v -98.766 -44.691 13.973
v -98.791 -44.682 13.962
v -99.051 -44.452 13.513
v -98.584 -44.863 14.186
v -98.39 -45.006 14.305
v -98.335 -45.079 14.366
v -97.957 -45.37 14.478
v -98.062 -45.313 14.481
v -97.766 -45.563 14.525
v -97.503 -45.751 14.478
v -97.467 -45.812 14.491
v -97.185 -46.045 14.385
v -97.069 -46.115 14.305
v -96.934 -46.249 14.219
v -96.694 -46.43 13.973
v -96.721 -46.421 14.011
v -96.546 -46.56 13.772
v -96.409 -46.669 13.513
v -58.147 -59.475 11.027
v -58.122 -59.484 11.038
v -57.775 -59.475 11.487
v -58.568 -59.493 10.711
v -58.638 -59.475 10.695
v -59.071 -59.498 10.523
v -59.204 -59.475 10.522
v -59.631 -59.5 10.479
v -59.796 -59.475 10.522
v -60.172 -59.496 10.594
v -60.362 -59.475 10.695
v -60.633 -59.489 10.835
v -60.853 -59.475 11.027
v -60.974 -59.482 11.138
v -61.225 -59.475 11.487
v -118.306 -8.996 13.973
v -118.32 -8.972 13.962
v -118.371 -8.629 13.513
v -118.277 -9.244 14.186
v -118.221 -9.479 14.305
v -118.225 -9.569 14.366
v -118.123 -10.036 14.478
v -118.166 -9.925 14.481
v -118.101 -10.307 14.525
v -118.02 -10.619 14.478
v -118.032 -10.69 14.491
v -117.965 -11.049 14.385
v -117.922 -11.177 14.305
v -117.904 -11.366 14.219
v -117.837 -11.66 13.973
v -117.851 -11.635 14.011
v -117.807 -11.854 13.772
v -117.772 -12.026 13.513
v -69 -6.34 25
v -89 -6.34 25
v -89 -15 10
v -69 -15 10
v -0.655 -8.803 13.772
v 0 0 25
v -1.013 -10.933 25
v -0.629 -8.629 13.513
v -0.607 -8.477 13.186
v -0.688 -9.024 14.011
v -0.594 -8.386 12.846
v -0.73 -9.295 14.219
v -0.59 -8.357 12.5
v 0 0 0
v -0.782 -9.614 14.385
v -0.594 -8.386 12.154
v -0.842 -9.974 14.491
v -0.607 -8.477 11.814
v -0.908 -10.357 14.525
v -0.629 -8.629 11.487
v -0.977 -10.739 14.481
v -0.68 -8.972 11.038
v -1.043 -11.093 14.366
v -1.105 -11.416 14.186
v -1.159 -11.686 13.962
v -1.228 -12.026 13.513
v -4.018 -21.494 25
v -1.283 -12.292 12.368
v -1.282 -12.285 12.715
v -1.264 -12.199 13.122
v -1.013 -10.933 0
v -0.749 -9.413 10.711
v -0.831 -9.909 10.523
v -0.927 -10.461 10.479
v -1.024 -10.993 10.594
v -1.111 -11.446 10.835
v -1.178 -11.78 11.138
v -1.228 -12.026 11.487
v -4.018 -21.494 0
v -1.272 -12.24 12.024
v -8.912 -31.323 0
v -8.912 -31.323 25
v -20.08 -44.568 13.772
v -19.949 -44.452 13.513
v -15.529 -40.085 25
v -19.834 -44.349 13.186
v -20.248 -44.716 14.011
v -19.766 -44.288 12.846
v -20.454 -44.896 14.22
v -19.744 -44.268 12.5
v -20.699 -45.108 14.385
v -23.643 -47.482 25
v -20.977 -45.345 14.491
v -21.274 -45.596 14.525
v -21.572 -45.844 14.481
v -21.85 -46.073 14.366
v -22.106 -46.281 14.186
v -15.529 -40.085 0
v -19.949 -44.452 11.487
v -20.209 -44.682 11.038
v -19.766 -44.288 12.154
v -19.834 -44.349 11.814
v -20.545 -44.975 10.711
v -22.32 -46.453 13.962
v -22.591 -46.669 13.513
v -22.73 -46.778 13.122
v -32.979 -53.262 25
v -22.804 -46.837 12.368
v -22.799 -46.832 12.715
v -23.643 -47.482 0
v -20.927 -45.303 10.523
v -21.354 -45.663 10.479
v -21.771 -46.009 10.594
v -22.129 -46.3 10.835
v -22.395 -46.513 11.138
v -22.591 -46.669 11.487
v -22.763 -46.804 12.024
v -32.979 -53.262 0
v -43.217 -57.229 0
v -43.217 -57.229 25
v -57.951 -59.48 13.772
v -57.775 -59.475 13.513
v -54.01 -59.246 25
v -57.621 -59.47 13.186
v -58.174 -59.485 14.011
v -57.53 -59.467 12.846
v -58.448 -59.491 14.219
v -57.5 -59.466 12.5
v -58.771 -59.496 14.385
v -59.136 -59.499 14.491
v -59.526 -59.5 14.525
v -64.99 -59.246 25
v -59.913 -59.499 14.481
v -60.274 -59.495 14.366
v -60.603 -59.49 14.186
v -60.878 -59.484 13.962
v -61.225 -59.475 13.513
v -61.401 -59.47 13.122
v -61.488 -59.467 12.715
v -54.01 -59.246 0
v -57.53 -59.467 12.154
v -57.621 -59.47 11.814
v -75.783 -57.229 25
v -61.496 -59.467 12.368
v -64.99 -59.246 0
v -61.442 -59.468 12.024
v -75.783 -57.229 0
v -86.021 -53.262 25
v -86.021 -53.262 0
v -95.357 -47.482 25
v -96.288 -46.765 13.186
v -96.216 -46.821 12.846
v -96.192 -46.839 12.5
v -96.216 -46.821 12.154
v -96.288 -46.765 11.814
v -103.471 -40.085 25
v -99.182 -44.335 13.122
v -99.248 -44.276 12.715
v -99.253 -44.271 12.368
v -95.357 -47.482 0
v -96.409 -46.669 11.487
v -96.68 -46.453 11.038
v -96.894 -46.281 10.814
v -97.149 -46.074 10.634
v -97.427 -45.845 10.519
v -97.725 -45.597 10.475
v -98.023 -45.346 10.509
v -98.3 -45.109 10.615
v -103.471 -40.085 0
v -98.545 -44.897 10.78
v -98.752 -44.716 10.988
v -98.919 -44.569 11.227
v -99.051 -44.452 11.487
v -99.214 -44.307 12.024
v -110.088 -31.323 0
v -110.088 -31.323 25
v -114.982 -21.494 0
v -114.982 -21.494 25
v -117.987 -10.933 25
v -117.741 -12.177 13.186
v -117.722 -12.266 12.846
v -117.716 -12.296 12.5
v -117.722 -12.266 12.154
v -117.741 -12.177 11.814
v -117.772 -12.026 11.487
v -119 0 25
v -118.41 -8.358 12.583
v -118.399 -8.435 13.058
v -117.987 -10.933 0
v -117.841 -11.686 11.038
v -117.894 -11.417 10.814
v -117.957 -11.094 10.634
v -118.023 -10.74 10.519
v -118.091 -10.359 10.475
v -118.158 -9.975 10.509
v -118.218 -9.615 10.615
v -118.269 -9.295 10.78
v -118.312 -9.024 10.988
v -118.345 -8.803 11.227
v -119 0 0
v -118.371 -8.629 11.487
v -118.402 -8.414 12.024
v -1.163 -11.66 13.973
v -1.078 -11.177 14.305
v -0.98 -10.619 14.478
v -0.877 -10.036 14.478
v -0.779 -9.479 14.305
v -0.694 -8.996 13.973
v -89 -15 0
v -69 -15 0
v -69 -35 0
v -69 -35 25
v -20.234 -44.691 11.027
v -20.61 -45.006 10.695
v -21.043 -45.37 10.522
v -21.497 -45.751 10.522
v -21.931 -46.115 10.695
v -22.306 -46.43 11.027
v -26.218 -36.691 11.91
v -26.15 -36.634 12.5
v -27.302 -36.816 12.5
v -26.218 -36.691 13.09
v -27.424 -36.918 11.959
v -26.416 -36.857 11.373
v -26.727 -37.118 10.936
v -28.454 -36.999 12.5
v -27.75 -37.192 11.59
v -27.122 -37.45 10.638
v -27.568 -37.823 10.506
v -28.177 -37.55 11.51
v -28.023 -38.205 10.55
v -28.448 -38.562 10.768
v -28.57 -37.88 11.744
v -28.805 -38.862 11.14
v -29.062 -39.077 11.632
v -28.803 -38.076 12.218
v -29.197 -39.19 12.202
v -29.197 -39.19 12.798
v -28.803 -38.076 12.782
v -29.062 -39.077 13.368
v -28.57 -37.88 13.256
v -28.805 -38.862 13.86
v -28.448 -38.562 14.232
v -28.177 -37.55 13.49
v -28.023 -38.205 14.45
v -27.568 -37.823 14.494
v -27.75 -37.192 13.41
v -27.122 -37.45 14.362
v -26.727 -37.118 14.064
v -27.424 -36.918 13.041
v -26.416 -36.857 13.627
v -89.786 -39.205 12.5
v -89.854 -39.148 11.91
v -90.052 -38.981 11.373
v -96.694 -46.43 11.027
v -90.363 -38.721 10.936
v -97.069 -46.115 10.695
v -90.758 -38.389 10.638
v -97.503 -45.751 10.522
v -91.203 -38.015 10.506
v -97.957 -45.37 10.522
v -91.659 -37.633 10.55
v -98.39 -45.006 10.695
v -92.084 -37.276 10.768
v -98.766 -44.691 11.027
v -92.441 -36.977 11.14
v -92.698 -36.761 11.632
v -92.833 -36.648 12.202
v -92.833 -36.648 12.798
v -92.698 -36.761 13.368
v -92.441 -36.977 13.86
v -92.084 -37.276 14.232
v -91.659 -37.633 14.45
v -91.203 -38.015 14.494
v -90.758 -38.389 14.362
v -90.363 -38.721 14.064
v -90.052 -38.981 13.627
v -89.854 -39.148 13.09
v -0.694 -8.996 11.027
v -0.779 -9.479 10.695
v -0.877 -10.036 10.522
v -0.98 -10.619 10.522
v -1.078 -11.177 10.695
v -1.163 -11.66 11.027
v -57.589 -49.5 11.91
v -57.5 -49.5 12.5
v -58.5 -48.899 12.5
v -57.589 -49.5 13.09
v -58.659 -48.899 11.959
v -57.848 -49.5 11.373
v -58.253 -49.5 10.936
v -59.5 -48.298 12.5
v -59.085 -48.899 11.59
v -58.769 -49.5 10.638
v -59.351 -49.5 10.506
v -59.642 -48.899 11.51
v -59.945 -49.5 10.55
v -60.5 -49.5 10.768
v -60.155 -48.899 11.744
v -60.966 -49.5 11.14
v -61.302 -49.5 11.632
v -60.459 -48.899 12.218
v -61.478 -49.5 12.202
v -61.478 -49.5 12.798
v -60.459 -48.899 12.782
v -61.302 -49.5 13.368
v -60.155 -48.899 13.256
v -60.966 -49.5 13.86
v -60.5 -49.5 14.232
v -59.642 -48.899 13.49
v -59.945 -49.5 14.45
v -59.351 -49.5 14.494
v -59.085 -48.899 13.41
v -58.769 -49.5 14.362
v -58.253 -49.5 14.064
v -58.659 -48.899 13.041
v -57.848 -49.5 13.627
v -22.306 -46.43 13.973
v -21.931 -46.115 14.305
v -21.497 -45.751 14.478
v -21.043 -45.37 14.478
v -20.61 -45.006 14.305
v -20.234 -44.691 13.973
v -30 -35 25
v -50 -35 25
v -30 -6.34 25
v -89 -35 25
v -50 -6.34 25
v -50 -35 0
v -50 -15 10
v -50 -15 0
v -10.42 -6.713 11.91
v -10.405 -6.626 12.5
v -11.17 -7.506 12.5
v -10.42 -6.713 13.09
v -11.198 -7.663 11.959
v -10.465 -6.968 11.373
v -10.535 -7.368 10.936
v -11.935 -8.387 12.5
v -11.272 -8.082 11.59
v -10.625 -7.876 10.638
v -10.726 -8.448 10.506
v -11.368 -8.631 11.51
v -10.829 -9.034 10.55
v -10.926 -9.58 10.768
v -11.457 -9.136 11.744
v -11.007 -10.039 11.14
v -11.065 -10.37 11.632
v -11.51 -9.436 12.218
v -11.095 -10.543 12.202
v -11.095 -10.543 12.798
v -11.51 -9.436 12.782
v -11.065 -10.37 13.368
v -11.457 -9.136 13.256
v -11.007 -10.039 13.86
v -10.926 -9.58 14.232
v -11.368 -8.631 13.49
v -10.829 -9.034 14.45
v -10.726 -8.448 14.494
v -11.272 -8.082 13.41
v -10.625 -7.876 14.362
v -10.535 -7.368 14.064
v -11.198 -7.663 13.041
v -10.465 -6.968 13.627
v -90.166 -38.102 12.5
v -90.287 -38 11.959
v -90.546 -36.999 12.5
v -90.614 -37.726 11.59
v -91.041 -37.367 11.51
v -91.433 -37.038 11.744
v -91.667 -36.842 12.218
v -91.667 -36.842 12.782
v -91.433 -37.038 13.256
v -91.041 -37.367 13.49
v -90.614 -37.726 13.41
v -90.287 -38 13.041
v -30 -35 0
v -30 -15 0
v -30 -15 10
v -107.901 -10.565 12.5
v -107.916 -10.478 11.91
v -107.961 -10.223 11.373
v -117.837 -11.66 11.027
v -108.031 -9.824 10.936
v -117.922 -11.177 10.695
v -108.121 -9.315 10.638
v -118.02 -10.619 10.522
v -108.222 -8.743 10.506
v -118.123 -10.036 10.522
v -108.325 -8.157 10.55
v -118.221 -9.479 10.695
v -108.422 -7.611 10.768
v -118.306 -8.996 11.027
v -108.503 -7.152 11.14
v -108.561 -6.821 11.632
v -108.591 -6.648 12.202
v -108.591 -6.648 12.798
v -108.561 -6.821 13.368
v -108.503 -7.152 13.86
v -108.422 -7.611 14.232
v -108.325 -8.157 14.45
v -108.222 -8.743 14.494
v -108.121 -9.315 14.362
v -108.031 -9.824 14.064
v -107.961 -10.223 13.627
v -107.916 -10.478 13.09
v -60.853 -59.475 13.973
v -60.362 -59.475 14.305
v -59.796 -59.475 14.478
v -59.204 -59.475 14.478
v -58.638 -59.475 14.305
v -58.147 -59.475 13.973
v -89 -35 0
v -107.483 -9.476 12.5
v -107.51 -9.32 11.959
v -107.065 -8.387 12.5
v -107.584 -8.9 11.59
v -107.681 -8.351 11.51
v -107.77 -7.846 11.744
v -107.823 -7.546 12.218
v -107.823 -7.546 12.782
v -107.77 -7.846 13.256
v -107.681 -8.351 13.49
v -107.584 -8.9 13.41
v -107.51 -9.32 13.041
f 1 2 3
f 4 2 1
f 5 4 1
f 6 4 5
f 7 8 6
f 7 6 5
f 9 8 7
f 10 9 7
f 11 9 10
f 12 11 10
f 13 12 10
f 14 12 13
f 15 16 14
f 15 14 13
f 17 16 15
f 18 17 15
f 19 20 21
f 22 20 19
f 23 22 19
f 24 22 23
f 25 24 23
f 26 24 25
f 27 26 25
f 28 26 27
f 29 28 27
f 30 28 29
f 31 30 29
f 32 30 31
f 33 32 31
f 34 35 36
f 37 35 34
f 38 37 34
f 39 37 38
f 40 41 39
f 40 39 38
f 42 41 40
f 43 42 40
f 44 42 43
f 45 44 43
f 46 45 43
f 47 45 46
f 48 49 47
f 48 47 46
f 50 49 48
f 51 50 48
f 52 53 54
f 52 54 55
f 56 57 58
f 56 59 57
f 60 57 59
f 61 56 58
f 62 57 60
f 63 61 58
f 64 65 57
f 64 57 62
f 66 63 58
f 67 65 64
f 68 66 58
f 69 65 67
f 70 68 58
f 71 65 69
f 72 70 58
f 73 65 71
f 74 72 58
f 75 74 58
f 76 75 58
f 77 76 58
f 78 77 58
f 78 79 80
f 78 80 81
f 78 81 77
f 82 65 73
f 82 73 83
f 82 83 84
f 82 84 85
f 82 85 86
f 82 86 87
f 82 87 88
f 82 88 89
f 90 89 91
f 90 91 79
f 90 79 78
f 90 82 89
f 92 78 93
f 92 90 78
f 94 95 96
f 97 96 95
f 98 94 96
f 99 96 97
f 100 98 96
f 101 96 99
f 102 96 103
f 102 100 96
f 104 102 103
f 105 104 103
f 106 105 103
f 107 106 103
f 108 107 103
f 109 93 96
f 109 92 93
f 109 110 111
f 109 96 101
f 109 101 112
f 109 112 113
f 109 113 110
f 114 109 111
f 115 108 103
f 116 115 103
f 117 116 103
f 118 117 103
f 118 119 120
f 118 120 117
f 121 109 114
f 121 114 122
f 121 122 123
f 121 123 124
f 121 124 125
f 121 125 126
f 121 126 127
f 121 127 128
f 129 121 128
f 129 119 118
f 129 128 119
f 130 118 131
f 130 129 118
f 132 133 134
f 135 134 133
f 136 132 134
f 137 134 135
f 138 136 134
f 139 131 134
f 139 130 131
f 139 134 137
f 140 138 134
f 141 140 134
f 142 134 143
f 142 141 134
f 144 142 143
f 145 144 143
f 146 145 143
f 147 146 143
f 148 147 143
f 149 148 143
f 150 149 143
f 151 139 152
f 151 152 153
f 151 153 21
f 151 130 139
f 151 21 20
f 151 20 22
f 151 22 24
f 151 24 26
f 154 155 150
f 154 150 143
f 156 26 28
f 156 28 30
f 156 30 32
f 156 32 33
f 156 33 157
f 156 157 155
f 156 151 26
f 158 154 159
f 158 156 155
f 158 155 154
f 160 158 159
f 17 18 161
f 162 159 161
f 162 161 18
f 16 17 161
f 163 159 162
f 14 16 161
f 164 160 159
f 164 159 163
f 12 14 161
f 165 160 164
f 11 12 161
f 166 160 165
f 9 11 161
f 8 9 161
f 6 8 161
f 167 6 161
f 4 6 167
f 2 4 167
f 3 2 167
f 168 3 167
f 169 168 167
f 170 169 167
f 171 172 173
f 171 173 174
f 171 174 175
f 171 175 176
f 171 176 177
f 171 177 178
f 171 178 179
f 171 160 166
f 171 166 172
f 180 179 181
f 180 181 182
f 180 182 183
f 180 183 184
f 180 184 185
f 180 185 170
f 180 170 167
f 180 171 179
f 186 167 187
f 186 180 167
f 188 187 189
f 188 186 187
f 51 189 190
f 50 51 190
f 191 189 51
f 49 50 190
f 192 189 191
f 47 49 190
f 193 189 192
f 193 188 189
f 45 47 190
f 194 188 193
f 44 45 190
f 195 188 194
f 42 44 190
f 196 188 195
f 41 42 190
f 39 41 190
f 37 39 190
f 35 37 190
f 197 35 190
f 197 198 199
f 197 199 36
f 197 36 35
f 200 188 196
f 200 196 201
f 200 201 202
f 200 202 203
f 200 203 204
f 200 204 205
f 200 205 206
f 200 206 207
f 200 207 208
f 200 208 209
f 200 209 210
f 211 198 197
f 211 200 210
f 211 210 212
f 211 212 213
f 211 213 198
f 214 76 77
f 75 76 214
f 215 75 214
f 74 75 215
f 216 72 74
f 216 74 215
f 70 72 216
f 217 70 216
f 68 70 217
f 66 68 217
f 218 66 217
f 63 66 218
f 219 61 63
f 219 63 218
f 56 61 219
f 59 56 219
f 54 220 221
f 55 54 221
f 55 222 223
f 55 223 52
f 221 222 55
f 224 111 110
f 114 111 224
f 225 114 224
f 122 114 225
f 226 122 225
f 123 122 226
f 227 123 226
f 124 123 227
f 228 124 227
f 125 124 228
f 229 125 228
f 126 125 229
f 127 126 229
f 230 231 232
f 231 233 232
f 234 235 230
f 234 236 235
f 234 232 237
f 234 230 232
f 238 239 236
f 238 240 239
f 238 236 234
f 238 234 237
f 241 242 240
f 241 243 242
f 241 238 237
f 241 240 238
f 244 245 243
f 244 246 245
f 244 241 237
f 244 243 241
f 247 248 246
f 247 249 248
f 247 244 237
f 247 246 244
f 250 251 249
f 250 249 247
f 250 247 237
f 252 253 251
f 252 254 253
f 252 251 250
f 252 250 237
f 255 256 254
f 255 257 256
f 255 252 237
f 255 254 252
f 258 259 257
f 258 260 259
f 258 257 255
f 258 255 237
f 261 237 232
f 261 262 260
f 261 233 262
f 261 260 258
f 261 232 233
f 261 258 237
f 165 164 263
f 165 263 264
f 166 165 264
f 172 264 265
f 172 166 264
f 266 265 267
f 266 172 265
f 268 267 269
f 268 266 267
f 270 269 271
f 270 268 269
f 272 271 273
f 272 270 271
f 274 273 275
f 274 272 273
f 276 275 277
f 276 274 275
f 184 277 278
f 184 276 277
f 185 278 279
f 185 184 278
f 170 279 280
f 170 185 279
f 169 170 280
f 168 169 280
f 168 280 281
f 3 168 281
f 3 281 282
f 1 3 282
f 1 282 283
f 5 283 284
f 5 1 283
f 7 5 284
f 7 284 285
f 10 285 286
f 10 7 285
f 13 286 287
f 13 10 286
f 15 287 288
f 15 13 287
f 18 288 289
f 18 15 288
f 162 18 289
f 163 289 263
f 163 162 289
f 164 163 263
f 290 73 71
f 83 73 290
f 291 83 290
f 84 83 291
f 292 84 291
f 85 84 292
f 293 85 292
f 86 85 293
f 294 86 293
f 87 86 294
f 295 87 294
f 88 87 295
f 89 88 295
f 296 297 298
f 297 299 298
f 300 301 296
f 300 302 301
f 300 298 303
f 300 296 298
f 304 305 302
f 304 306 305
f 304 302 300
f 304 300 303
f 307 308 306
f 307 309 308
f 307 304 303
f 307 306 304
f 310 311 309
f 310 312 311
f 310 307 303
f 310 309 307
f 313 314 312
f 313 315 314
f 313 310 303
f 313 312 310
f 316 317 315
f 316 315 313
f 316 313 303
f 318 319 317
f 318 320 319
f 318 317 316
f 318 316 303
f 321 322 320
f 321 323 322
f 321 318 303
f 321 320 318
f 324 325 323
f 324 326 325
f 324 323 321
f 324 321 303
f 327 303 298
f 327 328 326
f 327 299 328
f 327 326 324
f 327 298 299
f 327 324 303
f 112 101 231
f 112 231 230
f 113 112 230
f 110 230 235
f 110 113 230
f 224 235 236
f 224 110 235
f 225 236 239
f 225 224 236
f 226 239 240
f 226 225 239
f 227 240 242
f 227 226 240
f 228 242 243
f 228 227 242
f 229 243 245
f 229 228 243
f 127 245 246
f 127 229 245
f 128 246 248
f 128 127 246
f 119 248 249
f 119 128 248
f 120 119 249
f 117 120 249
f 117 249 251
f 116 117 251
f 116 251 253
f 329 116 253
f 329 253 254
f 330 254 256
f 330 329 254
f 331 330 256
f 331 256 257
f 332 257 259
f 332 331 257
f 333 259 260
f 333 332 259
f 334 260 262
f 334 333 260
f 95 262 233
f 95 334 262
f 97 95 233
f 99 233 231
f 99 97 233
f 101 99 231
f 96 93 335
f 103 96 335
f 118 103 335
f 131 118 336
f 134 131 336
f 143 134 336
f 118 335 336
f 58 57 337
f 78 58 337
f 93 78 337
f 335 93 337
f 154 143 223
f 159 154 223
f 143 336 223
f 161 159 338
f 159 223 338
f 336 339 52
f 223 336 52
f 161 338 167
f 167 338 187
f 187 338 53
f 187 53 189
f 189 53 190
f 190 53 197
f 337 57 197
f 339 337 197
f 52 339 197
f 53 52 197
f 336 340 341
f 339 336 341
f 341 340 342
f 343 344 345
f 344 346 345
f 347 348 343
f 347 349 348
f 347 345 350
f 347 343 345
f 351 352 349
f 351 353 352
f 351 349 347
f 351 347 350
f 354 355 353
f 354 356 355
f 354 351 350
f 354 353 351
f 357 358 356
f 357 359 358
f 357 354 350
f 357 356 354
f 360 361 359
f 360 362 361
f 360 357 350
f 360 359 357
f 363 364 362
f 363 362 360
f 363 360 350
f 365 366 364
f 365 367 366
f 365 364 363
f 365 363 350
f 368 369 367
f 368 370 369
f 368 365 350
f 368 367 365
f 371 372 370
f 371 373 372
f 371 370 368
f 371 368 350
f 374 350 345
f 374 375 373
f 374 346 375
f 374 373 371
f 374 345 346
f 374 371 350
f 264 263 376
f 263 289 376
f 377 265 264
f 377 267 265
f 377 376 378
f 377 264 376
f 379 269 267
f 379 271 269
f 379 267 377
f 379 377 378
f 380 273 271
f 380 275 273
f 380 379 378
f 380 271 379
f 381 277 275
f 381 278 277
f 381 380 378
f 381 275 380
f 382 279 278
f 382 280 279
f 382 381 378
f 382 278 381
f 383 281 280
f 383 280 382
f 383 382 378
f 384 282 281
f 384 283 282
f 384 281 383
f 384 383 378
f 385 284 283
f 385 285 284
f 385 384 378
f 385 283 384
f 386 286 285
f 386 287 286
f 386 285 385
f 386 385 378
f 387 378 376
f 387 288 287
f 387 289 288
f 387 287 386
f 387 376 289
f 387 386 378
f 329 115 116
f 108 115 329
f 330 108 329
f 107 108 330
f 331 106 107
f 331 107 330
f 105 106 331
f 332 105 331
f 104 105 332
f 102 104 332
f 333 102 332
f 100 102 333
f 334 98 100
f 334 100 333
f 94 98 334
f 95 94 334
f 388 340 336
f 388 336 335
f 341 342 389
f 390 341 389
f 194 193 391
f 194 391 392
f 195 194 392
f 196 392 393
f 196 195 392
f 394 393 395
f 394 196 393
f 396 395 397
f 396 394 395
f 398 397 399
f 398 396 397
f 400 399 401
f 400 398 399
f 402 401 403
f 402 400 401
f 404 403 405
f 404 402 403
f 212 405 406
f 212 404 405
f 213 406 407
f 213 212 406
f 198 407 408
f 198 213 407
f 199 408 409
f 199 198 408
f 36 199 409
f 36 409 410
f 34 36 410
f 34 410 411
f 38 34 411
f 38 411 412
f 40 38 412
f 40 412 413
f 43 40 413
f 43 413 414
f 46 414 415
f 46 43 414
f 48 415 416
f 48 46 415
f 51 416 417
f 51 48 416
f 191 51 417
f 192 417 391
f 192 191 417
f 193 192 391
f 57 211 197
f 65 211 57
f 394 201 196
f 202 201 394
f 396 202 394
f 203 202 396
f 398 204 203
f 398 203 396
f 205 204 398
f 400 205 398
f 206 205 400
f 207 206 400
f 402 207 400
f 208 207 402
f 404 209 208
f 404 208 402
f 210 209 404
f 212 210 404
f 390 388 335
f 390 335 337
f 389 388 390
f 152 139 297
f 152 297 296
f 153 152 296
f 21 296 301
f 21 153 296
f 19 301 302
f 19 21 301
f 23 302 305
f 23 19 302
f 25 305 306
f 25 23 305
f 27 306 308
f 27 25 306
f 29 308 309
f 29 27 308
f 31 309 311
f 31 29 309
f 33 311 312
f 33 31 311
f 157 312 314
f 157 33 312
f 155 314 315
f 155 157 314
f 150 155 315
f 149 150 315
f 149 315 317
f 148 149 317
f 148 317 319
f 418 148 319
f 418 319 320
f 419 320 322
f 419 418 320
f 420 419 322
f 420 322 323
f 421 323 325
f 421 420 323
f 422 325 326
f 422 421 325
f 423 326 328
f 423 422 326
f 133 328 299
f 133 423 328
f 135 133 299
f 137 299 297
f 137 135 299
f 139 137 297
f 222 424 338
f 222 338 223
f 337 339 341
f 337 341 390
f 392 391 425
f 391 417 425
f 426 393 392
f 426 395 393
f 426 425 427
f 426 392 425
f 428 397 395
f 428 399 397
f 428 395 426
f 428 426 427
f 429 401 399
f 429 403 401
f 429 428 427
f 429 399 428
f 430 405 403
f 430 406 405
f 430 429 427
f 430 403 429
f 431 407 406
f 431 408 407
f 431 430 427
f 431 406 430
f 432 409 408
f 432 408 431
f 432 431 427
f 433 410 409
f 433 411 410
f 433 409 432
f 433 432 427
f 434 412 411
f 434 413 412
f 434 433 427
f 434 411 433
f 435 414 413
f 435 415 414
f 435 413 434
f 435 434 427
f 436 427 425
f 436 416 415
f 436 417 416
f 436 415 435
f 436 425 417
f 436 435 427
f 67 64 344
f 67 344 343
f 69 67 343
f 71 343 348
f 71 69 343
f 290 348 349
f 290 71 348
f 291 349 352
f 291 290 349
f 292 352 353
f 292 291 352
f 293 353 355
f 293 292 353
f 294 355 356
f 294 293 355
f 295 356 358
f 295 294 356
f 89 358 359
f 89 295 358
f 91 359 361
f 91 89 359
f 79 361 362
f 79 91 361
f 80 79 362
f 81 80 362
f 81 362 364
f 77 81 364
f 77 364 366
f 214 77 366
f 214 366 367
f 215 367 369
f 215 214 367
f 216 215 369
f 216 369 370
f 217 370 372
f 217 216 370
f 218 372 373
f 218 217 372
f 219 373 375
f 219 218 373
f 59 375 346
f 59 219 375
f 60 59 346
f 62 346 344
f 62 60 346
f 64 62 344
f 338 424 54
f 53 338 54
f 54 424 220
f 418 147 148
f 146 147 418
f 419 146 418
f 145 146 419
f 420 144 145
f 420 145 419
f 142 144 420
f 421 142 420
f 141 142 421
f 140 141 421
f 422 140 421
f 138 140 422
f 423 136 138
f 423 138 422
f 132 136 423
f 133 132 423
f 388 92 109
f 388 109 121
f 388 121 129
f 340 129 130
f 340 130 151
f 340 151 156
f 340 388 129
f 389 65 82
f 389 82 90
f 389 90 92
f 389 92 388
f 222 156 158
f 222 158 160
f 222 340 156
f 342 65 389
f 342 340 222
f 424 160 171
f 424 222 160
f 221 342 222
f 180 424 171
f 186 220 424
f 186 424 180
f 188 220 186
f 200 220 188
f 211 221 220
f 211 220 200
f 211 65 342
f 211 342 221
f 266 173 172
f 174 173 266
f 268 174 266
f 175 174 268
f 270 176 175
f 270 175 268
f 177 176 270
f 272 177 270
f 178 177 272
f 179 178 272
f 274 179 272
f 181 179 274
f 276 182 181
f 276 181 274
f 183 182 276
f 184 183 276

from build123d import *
from OCP.BRepFilletAPI import BRepFilletAPI_MakeChamfer

# Parameters (mm, degrees)
SKETCH1_W           = 20
SKETCH1_H           = 20
BOSS_EXTRUDE1_DEPTH = 25
CIRPATTERN1_COUNT   = 5
CIRPATTERN1_ANGLE   = 160
CHAMFER1_SIZE       = 15
CHAMFER1_SIZE2      = 8.660254038


with BuildPart() as part:
    # Sketch1 → Boss-Extrude1 (new body)
    with BuildSketch(Plane.XY):
        with BuildLine():
            Line((-119, 0), (0, 0))
            ThreePointArc((0, 0), (-59.5, -59.5), (-119, 0))
        make_face()
        with Locations((-40, -25)):
            Rectangle(SKETCH1_W, SKETCH1_H, mode=Mode.SUBTRACT)
        with Locations((-79, -25)):
            Rectangle(SKETCH1_W, SKETCH1_H, mode=Mode.SUBTRACT)
    extrude(amount=BOSS_EXTRUDE1_DEPTH)

    # Sketch4 → Ø4.0mm Dowel Hole2 (revolve, cut)
    with BuildSketch(Plane(origin=(-0.903938696, -10.332066571, 12.5), x_dir=(0.1736481776669305, 0.9848077530122081, 0), z_dir=(0, 0, 1))):
        Polygon((0, 0), (0, 11.201721238), (2, 10), (2, 0.025), (2.025, 0), align=None)
    f_4_0mm_dowel_hole2 = revolve(axis=Axis((5.349590536, -11.434732499, 12.5), (-0.9848077530122081, 0.1736481776669305, 0)), mode=Mode.SUBTRACT)

    # CirPattern1: Ø4.0mm Dowel Hole2 ×5 about axis
    cirpattern1_axis = Axis((-59.5, 0, 0), (0, 0, -1))
    for i in range(1, CIRPATTERN1_COUNT):
        add(f_4_0mm_dowel_hole2.rotate(cirpattern1_axis, i * CIRPATTERN1_ANGLE / (CIRPATTERN1_COUNT - 1)), mode=Mode.SUBTRACT)

    # Chamfer1: one chamfer whose edges measure the first distance from different faces: ONE call of the kernel's chamfer builder (chamfer() names one face for all edges)
    chamfer1_edges_1 = [part.edges().sort_by_distance(p)[0] for p in [
        (-40, -15, 25),
    ]]
    chamfer1_side_1 = [part.faces().sort_by_distance(p)[0] for p in [
        (-40, -15, 12.5),
    ]]
    chamfer1_edges_2 = [part.edges().sort_by_distance(p)[0] for p in [
        (-79, -15, 25),
    ]]
    chamfer1_side_2 = [part.faces().sort_by_distance(p)[0] for p in [
        (-79, -15, 12.5),
    ]]
    chamfer1 = BRepFilletAPI_MakeChamfer(part.part.solid().wrapped)
    for e in chamfer1_edges_1:
        chamfer1.Add(CHAMFER1_SIZE, CHAMFER1_SIZE2, e.wrapped, chamfer1_side_1[0].wrapped)  # the first distance lies on this face
    for e in chamfer1_edges_2:
        chamfer1.Add(CHAMFER1_SIZE, CHAMFER1_SIZE2, e.wrapped, chamfer1_side_2[0].wrapped)  # the first distance lies on this face
    add(Compound.cast(chamfer1.Shape()), mode=Mode.REPLACE)


solid = part.part
